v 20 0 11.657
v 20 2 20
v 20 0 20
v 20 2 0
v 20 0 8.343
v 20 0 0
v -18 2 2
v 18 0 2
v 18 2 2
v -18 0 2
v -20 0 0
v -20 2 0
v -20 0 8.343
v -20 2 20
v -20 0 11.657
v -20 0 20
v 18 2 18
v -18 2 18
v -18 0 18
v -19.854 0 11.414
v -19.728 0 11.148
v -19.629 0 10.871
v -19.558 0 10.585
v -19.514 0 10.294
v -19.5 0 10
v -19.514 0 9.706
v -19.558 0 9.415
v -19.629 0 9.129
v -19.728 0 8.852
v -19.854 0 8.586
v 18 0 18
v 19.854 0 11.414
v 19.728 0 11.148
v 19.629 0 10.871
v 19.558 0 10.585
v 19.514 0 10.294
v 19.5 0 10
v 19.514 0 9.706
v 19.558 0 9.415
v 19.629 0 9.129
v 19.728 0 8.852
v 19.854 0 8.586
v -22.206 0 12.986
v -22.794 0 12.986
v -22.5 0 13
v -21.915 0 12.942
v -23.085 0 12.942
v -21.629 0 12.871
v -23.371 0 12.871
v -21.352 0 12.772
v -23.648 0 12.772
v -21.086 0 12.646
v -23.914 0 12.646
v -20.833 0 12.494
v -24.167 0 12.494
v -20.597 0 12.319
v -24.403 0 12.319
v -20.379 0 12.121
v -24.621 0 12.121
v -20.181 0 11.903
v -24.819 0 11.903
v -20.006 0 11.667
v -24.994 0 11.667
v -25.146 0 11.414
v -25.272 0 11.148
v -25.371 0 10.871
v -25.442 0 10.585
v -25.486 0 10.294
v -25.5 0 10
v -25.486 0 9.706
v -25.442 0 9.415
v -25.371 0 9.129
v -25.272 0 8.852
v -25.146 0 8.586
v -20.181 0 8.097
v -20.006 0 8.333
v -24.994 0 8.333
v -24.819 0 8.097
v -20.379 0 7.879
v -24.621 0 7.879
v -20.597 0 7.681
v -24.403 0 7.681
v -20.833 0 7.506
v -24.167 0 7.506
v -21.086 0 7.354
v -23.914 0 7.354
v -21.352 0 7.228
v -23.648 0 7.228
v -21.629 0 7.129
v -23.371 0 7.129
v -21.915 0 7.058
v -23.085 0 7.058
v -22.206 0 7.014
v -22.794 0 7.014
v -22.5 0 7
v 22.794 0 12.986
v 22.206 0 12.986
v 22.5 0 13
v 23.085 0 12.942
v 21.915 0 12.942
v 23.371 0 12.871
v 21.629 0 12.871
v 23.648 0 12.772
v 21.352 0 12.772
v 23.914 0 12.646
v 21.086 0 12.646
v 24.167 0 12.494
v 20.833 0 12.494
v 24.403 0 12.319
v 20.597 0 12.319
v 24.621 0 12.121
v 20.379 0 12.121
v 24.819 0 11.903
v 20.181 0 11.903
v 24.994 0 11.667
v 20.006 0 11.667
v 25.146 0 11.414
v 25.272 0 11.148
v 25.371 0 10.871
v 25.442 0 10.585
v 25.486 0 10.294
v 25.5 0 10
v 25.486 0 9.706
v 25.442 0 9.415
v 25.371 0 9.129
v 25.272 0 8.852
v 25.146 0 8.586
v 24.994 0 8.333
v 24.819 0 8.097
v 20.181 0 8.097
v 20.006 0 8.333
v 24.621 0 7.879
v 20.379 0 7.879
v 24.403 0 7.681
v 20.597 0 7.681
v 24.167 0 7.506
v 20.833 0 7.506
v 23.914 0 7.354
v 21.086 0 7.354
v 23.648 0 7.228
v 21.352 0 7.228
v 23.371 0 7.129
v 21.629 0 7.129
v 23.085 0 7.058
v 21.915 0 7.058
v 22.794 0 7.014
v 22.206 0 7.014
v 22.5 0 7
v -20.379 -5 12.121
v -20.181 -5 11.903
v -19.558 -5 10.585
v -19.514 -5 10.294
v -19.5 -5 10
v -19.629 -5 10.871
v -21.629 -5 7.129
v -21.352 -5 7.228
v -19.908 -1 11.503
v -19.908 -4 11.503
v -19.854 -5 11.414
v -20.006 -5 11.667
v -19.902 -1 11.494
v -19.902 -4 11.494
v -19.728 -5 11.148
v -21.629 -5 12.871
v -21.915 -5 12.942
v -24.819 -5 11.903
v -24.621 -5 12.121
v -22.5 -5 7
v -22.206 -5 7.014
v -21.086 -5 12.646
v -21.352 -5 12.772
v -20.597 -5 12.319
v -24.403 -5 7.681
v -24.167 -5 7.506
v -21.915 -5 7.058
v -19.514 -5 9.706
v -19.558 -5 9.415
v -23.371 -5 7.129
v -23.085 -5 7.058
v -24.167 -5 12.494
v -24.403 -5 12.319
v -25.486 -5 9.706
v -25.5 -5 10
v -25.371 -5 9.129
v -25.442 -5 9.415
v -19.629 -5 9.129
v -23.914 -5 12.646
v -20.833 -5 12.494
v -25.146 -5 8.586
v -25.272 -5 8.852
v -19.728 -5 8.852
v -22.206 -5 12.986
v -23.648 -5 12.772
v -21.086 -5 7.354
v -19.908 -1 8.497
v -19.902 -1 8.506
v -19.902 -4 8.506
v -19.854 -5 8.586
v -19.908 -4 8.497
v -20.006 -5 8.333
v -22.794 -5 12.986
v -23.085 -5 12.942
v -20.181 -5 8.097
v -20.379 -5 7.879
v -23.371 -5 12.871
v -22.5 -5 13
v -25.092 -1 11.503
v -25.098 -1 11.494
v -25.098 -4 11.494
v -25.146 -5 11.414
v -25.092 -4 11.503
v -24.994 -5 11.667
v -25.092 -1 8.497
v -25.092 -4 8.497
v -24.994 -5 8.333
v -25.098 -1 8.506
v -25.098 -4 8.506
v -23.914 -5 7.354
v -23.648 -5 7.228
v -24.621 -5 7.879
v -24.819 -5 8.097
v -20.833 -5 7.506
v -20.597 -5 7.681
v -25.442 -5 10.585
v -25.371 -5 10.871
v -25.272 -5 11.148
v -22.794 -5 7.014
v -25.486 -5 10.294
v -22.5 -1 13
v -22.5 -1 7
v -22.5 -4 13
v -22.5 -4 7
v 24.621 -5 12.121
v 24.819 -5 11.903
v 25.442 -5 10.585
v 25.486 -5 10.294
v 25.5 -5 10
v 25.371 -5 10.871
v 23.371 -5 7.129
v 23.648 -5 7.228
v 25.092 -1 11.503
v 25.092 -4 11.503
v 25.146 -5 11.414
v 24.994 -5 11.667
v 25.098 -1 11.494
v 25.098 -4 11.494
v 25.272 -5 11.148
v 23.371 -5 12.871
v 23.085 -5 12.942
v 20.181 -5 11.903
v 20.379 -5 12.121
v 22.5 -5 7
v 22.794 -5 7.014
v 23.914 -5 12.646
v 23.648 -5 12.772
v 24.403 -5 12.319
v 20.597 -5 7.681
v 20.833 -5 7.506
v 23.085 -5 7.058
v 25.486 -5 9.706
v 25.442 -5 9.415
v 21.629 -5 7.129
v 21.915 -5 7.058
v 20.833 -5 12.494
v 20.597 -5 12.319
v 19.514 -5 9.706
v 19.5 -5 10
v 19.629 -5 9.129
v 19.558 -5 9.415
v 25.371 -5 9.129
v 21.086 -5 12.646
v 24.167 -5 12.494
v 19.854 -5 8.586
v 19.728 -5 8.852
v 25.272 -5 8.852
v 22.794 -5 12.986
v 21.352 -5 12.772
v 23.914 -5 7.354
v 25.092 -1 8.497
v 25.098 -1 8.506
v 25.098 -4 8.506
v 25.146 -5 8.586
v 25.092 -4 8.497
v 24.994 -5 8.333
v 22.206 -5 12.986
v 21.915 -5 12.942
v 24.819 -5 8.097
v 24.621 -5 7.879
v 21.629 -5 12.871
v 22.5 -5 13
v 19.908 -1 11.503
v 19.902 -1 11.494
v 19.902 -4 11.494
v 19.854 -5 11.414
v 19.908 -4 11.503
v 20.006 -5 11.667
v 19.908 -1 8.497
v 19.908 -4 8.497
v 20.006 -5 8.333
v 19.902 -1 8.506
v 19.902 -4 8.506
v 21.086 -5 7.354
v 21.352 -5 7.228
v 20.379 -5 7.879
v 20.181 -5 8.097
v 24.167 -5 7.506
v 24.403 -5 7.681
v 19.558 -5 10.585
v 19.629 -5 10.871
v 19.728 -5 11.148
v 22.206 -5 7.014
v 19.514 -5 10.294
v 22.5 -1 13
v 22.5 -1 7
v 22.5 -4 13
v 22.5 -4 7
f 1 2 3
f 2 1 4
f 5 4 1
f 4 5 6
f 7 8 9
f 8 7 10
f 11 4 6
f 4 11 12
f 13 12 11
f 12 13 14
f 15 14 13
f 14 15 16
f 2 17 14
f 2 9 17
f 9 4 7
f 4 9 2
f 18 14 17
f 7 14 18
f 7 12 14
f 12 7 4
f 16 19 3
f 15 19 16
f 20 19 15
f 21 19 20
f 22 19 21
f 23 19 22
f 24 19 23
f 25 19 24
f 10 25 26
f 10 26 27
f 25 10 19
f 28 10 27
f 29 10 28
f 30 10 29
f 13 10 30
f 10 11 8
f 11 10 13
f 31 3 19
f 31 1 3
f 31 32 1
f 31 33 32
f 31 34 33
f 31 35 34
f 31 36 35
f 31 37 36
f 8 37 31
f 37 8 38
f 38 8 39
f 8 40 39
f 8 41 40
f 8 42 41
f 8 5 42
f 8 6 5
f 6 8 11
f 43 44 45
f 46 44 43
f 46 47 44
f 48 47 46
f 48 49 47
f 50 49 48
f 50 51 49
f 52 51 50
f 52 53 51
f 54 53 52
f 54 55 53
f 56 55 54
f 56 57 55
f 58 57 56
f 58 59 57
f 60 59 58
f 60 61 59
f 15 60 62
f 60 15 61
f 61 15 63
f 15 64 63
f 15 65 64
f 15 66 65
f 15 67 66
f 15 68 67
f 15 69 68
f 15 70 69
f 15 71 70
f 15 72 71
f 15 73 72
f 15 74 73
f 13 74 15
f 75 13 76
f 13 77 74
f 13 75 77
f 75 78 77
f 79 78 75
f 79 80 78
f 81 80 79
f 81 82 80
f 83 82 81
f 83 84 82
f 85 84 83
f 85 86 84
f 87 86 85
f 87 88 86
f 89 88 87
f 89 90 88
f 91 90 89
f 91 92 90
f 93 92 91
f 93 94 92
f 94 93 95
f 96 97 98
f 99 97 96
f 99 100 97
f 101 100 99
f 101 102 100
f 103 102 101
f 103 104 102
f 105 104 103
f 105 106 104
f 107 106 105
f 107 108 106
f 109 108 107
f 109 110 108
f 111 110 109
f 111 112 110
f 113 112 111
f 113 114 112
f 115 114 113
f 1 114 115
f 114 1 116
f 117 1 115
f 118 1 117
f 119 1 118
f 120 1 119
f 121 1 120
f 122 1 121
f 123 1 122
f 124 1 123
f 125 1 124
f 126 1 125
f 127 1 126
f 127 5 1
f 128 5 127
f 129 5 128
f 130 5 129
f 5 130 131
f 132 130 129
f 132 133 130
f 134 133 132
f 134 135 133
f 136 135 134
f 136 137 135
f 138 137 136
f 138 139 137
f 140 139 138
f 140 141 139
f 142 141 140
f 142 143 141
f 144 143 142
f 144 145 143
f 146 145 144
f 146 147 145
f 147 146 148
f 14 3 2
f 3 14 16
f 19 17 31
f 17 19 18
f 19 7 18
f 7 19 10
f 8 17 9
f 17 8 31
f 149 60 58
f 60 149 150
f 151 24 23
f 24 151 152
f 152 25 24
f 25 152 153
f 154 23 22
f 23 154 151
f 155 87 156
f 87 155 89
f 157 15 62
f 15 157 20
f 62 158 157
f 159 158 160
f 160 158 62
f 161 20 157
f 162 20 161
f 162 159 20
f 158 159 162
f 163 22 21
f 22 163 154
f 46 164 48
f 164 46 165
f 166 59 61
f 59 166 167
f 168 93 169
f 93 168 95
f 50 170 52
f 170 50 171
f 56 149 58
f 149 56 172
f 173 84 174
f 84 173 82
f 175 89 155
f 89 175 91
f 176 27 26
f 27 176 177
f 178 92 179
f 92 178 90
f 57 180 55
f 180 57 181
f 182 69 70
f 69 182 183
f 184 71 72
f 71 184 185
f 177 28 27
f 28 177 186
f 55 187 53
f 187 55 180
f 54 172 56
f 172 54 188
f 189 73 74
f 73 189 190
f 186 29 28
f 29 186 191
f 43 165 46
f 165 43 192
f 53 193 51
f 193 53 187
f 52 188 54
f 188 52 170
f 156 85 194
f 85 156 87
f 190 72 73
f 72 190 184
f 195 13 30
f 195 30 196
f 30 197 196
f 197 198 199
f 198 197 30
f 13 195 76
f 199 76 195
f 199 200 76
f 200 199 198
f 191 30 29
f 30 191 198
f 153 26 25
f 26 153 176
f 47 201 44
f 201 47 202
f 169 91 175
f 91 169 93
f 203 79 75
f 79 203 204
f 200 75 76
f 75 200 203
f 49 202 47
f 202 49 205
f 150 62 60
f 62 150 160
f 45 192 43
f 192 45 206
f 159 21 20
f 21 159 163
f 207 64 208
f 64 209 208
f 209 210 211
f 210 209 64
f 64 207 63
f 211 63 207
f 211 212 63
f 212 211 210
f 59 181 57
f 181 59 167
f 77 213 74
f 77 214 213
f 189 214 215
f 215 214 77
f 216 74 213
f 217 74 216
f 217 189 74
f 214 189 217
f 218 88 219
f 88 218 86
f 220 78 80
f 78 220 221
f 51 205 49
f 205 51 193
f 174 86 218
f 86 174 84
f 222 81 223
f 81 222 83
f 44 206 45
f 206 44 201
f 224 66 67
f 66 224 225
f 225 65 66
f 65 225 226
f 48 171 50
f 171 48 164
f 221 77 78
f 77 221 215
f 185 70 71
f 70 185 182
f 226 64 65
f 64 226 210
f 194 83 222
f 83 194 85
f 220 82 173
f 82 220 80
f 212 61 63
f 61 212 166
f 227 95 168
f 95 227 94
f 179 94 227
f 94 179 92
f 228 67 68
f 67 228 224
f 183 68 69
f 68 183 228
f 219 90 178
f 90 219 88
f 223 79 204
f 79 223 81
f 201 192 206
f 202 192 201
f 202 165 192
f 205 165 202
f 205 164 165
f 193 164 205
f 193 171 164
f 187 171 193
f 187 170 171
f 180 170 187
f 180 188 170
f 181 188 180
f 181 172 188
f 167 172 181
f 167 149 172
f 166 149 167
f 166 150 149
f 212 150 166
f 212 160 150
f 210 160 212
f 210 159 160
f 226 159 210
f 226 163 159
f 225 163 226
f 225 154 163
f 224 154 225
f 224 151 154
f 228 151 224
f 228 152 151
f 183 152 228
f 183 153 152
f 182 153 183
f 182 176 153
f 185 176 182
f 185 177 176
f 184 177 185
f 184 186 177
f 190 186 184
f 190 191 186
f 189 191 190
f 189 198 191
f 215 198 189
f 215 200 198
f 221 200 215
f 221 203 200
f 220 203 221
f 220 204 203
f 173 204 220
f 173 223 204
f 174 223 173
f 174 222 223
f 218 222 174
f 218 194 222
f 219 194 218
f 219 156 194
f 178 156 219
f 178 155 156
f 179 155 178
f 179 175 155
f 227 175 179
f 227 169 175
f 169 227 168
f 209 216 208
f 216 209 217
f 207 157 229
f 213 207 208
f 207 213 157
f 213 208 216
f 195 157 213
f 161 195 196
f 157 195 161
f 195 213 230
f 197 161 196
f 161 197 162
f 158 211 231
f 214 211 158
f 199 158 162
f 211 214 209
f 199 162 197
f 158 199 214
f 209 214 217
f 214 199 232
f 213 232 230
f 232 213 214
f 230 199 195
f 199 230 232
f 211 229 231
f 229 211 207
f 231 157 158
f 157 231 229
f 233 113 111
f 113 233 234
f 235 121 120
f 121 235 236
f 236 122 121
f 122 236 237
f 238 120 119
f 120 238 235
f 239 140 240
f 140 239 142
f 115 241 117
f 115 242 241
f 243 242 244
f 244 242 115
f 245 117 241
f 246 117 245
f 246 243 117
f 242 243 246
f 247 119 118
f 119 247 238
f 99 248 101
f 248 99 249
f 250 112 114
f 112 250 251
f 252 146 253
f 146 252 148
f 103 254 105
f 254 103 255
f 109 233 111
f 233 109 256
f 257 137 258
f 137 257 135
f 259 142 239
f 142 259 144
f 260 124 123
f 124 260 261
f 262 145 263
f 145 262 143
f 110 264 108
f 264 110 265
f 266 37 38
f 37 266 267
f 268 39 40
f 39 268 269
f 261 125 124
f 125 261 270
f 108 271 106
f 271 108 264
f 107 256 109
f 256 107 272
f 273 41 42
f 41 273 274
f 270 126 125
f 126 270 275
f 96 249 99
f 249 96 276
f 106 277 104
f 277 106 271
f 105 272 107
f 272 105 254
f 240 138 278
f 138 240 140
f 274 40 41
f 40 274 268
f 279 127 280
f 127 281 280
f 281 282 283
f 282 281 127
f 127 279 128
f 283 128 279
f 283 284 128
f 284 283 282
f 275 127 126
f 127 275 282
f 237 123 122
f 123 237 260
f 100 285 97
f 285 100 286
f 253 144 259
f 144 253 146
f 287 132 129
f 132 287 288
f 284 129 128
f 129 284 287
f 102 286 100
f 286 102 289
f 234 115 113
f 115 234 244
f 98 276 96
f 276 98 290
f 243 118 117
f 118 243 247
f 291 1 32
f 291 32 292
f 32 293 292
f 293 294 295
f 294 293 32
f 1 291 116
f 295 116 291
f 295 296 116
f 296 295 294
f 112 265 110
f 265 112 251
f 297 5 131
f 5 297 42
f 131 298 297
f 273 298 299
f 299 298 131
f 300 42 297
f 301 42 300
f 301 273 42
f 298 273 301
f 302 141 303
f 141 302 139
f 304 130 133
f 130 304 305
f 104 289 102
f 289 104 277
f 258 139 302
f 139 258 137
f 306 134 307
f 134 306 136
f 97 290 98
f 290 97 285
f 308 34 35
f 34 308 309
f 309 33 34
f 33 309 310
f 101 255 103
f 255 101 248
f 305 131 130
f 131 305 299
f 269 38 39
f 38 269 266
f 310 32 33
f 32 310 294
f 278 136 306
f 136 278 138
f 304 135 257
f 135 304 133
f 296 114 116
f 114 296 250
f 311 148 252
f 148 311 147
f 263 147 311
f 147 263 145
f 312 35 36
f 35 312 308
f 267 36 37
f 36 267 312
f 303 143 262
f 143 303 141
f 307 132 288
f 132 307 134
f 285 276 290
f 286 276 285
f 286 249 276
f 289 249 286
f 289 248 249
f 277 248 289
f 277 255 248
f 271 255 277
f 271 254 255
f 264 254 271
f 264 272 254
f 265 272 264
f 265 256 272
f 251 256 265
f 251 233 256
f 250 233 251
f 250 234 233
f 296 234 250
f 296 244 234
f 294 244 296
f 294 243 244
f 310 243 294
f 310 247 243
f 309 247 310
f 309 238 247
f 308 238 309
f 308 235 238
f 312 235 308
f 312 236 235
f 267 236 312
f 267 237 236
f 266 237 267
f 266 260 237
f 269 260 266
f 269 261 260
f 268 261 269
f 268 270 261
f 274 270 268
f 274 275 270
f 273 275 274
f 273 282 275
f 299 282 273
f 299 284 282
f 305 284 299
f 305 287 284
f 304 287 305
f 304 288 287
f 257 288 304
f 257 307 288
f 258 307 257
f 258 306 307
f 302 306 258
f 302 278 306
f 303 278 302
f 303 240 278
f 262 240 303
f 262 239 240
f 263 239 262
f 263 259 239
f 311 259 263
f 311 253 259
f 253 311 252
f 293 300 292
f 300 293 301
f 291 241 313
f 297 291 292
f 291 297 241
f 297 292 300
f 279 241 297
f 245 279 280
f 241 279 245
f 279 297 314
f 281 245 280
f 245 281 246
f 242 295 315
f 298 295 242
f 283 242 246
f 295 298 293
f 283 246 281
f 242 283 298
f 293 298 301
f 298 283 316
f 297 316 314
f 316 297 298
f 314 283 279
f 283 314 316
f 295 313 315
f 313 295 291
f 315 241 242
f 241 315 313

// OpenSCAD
module u_shaped_rod() {
    rod_thickness = 2;
    rod_length = 40;
    rod_height = 20;
    boss_diameter = 6;
    boss_height = 5;
    hex_size = 3;
    hex_depth = 3;
    $fn = 64;

    // U-shaped rod
    difference() {
        union() {
            translate([-rod_length/2, 0, 0])
                cube([rod_length, rod_thickness, rod_thickness]);
            translate([-rod_length/2, 0, rod_height - rod_thickness])
                cube([rod_length, rod_thickness, rod_thickness]);
            translate([-rod_length/2, 0, rod_thickness])
                cube([rod_thickness, rod_thickness, rod_height - 2 * rod_thickness]);
            translate([rod_length/2 - rod_thickness, 0, rod_thickness])
                cube([rod_thickness, rod_thickness, rod_height - 2 * rod_thickness]);
        }
    }

    // End bosses with hex sockets
    for (i = [-1, 1]) {
        translate([i * (rod_length/2 + boss_height/2), 0, rod_height/2])
            rotate([90, 0, 0])
                difference() {
                    cylinder(h = boss_height, d = boss_diameter, $fn = $fn);
                    translate([0, 0, boss_height/2 - hex_depth/2])
                        rotate([0, 0, 0])
                            hex_socket(hex_size, hex_depth);
                }
    }
}

module hex_socket(size, depth) {
    rotate([0, 0, 30])
        linear_extrude(height = depth)
            polygon(points = [
                [size * cos(0), size * sin(0)],
                [size * cos(60), size * sin(60)],
                [size * cos(120), size * sin(120)],
                [size * cos(180), size * sin(180)],
                [size * cos(240), size * sin(240)],
                [size * cos(300), size * sin(300)]
            ]);
}

u_shaped_rod();
